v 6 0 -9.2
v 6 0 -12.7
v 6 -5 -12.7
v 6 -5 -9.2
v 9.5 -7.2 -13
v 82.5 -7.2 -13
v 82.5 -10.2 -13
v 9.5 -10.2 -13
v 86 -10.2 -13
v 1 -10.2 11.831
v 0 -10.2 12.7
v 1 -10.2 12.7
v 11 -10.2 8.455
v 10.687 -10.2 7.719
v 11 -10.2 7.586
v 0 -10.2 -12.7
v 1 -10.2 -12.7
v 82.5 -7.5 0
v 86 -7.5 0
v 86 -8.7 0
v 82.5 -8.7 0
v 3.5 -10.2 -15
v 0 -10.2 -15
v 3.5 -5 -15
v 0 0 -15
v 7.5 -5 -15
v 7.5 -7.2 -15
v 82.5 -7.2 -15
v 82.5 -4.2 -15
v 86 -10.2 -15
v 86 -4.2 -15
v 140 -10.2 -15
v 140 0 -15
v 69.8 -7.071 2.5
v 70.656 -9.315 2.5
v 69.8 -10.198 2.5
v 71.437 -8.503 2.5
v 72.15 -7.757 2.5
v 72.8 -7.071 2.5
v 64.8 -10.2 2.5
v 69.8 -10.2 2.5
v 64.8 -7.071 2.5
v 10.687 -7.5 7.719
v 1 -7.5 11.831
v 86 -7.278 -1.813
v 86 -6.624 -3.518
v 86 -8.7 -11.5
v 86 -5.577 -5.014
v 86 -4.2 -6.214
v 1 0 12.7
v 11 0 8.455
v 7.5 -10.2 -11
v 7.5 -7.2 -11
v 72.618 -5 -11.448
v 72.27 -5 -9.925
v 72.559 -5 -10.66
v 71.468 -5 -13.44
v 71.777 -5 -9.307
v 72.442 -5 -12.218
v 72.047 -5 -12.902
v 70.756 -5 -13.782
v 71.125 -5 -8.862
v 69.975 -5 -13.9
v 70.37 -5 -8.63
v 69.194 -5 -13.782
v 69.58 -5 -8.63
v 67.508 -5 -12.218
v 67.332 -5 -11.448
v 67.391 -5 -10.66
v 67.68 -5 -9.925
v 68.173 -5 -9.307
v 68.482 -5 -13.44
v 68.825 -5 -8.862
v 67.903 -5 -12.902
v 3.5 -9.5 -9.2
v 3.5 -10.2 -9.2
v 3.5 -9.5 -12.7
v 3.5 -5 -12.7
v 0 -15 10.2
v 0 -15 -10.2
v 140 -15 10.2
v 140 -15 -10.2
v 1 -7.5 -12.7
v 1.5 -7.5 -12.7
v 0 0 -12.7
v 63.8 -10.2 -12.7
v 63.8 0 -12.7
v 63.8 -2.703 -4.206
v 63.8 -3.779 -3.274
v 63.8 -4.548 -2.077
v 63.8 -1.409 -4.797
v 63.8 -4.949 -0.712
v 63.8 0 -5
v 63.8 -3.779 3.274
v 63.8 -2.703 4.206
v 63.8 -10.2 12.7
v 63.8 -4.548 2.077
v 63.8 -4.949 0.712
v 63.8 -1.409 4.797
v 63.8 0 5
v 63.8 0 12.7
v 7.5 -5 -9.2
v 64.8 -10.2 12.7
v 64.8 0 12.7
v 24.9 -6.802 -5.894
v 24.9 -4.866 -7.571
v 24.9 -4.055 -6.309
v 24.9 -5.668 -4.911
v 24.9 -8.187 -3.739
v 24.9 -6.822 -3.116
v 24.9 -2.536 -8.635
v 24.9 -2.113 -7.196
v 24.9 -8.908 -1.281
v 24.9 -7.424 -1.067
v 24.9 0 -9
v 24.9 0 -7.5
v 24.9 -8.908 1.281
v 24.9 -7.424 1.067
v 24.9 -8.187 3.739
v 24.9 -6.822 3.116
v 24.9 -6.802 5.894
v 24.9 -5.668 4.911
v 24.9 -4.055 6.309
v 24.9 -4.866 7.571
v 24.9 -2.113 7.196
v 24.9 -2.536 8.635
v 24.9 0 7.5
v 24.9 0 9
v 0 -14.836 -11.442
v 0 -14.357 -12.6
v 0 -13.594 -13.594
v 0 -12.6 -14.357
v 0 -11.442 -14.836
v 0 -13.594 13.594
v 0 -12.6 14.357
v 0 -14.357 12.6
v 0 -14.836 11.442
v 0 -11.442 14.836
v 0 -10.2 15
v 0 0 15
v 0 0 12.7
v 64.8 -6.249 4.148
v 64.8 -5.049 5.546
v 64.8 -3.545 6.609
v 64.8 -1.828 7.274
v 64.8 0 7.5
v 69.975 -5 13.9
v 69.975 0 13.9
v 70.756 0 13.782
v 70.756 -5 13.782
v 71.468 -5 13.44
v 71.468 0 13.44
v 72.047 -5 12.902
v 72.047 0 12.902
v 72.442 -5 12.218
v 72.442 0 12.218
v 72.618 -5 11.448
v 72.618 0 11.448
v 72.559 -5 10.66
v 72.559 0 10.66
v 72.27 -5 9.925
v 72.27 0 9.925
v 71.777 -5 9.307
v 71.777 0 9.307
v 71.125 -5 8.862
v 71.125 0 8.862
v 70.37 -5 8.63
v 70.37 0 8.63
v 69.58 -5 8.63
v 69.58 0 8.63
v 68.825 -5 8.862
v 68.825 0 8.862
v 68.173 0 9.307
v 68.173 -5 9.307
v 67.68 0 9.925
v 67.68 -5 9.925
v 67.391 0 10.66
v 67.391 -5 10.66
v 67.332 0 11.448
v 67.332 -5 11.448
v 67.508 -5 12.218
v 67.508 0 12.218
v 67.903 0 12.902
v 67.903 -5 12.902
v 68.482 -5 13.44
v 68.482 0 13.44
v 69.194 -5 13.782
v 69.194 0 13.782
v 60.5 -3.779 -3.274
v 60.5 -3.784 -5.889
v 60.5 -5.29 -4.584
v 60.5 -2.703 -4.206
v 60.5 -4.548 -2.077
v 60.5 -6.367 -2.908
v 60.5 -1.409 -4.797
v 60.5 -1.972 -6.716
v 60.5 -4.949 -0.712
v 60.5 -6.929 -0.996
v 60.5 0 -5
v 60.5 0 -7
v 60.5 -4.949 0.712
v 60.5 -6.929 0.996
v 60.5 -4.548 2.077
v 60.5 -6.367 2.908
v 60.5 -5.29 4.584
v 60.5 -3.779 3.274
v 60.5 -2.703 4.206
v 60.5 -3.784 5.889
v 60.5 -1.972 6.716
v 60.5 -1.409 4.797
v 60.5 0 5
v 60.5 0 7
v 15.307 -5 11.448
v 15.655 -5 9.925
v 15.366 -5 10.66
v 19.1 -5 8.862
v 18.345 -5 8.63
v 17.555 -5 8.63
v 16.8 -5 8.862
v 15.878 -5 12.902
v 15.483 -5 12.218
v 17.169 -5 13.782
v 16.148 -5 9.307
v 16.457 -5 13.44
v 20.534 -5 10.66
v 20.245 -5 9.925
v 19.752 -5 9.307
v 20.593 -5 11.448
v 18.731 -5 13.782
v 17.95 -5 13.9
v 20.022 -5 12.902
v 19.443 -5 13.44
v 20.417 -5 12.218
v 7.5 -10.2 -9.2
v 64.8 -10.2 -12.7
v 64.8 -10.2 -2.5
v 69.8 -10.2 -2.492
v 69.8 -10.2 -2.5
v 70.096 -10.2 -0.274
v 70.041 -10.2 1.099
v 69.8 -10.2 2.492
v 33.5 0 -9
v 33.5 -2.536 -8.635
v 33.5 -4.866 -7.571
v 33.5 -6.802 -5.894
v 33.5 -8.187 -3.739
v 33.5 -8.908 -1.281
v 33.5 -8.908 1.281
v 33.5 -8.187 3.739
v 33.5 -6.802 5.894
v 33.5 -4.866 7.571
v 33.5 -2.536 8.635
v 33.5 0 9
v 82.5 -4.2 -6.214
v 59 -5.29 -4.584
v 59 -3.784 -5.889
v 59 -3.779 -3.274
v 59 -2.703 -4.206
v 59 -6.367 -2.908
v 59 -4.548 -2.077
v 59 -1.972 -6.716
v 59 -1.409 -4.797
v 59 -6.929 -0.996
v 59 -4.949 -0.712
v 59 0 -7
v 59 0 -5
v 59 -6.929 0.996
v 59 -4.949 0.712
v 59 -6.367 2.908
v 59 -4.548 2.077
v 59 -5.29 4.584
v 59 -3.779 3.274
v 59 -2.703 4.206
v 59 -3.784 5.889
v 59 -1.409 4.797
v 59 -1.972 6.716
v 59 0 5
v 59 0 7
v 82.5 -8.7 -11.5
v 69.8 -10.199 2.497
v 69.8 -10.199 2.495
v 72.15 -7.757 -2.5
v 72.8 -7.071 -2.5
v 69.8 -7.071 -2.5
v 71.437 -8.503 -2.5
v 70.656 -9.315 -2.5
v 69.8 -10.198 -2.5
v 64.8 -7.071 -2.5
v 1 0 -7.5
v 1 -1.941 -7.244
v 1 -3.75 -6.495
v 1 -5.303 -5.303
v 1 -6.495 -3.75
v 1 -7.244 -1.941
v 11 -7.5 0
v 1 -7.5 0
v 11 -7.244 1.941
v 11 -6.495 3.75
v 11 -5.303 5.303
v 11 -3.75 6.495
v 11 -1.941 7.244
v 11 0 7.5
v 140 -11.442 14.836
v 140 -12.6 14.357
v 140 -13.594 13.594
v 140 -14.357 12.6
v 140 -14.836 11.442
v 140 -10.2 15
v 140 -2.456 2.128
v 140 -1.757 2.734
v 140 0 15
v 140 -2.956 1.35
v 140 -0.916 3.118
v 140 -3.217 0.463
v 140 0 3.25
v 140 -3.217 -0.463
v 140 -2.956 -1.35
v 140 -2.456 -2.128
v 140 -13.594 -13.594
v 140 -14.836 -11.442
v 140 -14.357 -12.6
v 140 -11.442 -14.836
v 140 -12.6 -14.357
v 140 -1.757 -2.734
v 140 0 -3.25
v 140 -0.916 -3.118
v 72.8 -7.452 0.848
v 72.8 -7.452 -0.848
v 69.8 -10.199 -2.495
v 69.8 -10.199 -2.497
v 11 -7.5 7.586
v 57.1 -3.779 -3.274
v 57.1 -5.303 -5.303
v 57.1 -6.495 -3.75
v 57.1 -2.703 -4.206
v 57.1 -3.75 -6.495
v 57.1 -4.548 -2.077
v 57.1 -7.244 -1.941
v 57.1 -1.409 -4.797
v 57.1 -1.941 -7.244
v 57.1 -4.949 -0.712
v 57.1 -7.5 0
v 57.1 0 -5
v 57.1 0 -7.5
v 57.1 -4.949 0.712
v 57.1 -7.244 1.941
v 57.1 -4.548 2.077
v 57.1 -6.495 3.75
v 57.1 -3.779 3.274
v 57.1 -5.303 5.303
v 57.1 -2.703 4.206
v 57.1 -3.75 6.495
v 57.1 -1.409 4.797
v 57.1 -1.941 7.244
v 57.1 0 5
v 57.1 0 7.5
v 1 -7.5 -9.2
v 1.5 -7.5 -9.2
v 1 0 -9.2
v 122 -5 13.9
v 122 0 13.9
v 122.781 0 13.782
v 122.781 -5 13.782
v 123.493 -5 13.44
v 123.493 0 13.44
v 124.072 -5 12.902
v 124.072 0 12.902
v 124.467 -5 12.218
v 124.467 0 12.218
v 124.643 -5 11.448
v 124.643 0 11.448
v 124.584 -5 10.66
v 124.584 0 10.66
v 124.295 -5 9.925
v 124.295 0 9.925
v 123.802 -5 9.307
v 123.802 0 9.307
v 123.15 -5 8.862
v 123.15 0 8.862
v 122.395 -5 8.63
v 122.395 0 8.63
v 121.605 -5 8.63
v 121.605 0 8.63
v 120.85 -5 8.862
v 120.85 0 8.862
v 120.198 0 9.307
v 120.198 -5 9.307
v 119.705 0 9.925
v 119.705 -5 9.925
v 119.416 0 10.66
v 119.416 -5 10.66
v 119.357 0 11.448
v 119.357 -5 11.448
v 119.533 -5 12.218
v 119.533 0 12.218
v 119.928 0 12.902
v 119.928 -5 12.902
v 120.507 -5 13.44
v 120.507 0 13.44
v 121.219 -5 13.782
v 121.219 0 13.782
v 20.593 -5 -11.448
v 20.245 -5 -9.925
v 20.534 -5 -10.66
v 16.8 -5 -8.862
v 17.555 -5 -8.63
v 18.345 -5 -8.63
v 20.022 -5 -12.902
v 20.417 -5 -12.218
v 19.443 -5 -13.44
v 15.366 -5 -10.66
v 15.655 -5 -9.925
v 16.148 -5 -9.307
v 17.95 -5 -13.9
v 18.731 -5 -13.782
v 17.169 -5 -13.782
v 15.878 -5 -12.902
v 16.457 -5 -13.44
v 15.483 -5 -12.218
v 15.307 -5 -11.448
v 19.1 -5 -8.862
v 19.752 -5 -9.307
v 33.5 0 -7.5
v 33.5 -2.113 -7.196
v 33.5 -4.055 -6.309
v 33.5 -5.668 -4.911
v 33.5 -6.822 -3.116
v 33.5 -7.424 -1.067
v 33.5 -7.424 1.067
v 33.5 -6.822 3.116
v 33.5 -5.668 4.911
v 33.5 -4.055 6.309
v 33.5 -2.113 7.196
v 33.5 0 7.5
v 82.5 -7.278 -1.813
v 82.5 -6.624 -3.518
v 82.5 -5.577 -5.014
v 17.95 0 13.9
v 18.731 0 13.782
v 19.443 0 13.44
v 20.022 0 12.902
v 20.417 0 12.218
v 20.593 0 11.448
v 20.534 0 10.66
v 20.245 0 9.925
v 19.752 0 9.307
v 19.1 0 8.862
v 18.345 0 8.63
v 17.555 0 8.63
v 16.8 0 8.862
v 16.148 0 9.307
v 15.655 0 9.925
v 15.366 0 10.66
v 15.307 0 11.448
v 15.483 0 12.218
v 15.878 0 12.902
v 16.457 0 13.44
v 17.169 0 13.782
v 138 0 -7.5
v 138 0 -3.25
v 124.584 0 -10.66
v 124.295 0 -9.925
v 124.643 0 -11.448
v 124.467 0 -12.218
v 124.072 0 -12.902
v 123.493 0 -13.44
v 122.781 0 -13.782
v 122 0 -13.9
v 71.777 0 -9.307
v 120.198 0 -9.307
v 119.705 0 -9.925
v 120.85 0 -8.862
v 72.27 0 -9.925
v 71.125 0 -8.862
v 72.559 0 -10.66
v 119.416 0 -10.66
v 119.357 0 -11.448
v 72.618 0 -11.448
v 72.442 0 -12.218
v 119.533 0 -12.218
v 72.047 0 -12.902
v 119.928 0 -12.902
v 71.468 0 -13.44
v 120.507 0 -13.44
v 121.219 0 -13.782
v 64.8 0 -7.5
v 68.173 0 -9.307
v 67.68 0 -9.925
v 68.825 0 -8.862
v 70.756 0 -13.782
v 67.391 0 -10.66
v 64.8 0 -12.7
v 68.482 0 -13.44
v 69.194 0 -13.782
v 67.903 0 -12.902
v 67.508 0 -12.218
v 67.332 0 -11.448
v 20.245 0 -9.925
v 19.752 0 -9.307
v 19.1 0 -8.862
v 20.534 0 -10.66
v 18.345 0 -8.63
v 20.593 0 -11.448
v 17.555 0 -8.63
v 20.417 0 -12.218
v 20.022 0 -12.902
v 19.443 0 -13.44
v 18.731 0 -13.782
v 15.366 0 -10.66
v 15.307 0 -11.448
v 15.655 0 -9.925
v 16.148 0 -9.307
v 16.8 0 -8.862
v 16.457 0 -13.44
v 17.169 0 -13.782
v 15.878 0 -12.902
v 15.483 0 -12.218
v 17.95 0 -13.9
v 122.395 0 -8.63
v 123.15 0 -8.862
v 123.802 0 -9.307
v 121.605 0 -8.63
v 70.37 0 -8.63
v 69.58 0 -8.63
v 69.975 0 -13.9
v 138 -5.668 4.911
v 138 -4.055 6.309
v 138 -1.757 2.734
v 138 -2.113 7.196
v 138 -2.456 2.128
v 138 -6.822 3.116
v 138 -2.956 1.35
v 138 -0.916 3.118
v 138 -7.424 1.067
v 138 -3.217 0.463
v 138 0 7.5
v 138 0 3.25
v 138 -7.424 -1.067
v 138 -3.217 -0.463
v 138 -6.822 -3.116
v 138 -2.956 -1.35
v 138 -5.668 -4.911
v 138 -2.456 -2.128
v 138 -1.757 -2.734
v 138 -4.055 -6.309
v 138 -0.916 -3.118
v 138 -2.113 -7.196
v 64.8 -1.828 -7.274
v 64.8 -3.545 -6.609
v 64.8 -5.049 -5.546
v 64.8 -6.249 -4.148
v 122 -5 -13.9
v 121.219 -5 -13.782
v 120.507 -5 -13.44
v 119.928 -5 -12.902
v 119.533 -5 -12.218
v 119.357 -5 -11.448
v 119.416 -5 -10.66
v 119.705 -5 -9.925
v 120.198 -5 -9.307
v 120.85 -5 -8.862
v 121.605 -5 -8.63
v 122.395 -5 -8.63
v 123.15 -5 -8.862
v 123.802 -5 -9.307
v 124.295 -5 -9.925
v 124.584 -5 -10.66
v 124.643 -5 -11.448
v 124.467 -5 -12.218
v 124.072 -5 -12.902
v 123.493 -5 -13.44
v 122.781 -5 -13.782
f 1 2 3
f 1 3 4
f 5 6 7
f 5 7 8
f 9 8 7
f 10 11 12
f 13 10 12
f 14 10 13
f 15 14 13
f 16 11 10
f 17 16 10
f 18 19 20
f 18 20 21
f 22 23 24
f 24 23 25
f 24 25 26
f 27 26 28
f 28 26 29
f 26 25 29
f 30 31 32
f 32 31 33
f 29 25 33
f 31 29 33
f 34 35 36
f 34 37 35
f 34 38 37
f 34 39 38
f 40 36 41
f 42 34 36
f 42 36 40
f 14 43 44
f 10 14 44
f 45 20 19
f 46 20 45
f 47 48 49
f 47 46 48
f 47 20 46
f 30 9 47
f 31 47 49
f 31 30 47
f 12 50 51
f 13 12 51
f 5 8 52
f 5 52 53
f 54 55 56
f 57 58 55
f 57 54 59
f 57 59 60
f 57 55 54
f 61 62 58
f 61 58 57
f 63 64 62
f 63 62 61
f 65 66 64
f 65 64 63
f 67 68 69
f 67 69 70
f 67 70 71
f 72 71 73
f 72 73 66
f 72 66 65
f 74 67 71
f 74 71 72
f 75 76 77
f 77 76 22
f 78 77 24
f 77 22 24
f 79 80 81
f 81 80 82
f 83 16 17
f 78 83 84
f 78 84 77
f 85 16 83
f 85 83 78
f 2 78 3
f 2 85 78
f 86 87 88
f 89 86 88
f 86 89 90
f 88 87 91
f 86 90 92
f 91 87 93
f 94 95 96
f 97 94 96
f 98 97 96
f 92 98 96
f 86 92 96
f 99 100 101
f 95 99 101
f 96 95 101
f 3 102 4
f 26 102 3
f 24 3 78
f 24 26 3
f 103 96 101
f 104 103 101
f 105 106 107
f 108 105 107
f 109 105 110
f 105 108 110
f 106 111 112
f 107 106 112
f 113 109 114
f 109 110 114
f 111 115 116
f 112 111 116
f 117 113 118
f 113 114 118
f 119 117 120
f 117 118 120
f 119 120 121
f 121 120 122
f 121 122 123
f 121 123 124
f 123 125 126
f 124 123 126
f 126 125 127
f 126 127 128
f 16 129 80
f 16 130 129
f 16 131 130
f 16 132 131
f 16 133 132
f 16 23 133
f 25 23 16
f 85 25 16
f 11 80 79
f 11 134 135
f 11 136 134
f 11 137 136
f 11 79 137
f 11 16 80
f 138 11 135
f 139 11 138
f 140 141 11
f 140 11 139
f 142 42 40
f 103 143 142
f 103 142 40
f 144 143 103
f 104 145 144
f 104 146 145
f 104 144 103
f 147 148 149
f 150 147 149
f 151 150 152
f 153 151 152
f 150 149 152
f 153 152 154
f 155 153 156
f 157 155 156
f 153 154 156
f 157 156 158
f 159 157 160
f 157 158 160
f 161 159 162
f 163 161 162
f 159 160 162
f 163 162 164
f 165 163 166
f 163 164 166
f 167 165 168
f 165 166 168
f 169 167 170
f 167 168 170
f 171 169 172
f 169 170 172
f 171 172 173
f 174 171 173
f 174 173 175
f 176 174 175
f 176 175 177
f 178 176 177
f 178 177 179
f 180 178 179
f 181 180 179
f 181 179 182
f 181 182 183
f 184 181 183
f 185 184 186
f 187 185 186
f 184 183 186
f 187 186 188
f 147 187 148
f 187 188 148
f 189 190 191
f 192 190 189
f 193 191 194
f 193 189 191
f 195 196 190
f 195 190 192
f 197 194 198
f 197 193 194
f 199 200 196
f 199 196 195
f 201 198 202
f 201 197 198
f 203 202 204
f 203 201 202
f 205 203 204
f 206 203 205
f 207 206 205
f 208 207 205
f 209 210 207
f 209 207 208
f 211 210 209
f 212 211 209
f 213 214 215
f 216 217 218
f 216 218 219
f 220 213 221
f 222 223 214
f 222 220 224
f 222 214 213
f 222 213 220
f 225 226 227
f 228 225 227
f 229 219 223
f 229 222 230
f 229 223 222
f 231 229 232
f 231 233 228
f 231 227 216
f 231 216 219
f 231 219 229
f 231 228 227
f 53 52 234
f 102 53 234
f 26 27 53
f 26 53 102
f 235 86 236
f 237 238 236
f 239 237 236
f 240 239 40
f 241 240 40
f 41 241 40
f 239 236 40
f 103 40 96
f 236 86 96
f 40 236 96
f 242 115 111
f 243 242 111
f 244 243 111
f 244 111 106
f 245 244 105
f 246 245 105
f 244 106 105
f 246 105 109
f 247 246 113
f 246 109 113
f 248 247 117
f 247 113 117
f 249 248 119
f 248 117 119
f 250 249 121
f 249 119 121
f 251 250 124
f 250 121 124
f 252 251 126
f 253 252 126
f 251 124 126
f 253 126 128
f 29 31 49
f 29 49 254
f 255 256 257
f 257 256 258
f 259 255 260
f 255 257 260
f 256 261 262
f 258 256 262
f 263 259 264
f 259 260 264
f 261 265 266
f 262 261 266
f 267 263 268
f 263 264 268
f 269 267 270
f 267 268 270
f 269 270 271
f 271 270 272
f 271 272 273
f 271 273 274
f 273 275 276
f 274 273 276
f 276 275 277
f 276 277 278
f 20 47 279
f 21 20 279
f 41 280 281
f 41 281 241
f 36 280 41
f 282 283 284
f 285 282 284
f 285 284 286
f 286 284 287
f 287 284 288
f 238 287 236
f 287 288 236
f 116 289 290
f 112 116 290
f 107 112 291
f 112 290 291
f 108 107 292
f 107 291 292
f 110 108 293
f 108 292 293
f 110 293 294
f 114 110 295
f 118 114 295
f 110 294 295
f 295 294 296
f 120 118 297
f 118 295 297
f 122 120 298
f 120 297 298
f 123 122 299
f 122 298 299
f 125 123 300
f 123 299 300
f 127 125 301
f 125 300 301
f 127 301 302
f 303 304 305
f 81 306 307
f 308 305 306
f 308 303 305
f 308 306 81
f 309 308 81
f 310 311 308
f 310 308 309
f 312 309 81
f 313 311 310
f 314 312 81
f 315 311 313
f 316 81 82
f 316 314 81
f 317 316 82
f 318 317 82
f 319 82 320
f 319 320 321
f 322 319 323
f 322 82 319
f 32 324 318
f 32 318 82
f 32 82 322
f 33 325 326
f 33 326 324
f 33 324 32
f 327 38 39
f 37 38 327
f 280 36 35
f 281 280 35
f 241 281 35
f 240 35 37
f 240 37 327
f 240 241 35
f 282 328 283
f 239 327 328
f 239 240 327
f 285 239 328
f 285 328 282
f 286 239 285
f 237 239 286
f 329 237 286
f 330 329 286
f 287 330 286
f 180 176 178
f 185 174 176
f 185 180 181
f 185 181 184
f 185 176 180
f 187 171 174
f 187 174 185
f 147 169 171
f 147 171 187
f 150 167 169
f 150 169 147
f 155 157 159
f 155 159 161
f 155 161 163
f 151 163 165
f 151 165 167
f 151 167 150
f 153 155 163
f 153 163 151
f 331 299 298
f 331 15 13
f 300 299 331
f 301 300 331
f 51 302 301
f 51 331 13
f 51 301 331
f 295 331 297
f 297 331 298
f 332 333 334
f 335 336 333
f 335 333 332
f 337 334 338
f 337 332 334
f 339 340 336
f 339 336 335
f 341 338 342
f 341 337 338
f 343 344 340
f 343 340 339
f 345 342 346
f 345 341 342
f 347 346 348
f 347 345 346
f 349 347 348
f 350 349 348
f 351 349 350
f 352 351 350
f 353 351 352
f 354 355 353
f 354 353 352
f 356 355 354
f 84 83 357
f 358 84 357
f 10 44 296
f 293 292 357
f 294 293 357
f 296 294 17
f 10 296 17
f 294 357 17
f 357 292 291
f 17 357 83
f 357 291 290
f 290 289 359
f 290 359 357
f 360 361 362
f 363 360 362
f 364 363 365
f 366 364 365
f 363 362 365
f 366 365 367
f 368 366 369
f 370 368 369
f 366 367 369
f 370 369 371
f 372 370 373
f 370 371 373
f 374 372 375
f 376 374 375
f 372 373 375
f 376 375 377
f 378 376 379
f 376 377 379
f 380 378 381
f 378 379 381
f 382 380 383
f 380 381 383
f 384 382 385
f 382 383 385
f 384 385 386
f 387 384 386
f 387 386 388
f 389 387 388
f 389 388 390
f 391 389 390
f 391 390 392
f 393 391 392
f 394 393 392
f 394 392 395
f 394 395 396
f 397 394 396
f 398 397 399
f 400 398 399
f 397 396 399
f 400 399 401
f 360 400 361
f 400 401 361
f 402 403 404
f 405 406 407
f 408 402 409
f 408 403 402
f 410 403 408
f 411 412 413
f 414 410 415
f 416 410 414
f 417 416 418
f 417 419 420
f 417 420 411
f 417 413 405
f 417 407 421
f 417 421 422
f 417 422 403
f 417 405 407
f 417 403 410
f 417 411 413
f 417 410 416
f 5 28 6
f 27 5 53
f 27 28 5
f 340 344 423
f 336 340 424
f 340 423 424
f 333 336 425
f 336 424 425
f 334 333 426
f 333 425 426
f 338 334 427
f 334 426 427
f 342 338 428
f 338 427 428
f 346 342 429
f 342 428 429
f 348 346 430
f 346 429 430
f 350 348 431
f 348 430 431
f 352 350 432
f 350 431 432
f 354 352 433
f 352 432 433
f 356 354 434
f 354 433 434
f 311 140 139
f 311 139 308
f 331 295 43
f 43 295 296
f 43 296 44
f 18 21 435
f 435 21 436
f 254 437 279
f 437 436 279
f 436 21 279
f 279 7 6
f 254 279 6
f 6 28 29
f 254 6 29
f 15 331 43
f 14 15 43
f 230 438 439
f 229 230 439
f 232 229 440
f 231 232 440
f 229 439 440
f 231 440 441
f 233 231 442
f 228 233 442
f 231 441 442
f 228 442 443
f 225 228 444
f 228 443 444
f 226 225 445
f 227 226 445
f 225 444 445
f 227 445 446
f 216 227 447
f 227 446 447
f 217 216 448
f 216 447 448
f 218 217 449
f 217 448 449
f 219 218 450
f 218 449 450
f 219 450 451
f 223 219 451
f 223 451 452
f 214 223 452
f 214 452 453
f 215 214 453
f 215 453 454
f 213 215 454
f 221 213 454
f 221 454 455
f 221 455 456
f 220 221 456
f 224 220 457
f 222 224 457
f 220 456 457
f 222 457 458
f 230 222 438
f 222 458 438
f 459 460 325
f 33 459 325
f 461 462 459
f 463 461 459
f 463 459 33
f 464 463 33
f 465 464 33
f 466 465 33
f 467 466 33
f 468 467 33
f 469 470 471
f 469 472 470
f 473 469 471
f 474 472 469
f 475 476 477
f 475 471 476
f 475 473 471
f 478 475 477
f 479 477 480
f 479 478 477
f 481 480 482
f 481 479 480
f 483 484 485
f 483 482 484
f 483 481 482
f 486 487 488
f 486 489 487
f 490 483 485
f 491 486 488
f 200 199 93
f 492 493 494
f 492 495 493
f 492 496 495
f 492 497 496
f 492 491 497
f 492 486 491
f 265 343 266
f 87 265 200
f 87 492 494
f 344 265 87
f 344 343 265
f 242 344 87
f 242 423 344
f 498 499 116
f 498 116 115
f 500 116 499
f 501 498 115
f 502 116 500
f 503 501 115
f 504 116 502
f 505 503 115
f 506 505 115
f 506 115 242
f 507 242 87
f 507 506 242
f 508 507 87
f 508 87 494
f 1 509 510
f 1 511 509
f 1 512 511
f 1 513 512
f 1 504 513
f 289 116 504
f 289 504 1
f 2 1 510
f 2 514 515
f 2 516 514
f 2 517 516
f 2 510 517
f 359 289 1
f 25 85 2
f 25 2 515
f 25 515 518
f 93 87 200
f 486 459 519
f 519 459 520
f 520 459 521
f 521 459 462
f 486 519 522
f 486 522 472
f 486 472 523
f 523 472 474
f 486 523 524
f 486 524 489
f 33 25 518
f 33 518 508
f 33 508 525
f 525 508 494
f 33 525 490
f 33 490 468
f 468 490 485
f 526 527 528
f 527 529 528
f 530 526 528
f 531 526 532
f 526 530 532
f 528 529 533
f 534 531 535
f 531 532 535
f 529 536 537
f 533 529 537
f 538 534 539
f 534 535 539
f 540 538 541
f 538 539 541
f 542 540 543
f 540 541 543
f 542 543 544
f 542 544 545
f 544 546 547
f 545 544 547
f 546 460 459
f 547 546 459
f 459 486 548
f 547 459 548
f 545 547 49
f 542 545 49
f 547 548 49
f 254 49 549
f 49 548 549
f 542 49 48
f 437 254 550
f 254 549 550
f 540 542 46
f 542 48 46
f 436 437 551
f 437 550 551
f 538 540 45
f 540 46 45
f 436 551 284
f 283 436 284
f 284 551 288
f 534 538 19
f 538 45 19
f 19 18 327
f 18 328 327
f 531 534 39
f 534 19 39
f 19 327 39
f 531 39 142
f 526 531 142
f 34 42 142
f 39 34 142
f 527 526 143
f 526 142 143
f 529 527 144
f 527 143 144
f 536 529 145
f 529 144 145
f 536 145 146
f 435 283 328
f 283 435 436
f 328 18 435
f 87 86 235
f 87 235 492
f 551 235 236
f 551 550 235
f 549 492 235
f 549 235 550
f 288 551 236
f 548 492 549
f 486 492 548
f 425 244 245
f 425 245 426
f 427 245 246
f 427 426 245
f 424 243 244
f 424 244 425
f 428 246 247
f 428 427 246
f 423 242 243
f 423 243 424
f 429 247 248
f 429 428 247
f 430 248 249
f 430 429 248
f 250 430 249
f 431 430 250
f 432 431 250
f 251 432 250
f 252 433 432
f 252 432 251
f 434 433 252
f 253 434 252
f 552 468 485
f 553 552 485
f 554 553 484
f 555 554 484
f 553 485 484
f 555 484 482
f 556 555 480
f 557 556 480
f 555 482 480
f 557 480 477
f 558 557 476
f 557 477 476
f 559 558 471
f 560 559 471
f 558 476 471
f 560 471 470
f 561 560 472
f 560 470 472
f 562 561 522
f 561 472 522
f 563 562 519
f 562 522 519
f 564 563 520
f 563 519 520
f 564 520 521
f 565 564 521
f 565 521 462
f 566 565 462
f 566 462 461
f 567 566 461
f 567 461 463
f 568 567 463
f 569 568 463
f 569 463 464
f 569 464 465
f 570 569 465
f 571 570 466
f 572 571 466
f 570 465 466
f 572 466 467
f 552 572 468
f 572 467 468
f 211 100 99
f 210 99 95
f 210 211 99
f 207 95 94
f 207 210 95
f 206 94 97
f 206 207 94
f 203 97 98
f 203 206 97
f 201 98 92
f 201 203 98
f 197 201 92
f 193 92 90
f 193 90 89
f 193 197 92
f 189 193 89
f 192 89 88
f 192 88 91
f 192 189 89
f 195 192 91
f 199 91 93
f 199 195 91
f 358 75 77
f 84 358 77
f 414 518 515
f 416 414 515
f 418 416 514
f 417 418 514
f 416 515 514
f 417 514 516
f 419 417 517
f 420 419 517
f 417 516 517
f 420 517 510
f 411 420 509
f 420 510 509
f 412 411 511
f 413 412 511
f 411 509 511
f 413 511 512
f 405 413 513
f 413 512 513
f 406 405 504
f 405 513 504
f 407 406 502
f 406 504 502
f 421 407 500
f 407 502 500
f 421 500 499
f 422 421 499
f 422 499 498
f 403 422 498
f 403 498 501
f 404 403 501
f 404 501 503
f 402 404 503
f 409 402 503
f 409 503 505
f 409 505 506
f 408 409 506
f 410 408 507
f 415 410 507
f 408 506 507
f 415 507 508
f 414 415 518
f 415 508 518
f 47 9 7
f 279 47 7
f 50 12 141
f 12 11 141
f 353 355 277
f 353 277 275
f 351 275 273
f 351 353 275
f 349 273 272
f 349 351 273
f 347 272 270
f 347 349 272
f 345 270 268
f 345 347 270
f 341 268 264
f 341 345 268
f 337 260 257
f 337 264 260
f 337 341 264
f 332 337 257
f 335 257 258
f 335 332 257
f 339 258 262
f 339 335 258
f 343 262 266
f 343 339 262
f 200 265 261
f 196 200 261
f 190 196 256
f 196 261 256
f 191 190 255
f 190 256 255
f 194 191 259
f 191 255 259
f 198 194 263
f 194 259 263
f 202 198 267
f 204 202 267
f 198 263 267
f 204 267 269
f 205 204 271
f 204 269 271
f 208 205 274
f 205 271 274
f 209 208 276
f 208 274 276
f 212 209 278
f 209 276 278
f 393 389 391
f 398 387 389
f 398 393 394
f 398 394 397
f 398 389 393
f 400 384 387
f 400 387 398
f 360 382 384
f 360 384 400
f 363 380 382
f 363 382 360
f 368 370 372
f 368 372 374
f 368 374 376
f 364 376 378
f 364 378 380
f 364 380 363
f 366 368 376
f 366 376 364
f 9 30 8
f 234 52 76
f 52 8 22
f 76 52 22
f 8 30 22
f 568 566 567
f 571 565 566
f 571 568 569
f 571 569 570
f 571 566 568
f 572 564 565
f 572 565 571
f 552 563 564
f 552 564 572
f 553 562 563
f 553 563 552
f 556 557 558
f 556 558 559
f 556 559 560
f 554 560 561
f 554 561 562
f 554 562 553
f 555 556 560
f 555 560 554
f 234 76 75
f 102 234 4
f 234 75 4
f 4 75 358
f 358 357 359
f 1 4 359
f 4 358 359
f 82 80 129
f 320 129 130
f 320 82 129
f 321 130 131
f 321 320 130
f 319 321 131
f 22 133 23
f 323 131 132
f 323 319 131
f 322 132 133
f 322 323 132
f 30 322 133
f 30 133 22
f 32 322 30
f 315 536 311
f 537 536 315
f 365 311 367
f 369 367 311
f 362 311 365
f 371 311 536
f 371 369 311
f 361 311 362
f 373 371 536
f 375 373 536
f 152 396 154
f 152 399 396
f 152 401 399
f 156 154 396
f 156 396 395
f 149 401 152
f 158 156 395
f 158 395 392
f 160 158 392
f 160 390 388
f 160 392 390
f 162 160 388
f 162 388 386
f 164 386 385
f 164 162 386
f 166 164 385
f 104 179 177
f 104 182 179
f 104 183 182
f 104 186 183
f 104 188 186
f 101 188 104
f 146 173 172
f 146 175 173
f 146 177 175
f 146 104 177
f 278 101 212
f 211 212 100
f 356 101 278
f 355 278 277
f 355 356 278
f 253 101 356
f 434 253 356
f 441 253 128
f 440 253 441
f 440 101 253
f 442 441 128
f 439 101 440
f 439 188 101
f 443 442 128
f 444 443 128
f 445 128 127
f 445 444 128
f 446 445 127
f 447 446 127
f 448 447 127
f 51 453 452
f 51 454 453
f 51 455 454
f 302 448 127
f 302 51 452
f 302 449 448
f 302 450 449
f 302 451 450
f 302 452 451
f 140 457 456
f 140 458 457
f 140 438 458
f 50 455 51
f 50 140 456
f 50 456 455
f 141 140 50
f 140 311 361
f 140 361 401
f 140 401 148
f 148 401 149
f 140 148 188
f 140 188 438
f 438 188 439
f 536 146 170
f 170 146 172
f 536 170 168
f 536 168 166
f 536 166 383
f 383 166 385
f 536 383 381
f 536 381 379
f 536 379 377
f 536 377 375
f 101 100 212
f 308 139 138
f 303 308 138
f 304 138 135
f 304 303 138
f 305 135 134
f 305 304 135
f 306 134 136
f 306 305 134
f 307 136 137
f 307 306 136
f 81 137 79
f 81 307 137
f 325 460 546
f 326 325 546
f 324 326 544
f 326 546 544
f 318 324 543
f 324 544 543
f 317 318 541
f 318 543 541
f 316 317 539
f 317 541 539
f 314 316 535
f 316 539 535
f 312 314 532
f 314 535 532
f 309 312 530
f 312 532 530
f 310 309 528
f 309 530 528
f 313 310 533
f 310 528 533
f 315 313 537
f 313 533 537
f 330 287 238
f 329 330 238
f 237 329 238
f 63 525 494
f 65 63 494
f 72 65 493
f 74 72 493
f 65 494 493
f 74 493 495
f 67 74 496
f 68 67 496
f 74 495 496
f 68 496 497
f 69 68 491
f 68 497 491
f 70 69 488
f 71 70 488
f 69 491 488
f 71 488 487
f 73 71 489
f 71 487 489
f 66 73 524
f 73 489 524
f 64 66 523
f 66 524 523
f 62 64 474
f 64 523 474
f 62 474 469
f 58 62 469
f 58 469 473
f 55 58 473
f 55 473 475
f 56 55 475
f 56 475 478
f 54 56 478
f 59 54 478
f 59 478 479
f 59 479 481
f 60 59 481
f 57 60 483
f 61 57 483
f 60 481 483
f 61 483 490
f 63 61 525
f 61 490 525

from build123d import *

# Parameters (mm, degrees)
SKETCH2_W             = 140
SKETCH2_H             = 15
BASE_DEPTH            = 15
SKETCH3_R             = 7.5
CENTER_CUT_DEPTH      = 142.598022585
SKETCH4_W             = 1
SKETCH4_H             = 25.4
ANTENNA_PCB_DEPTH     = 10.2
SKETCH11_W            = 3.5
SKETCH11_H            = 15
COAX_CONNECTOR_DEPTH  = 5
LENS_START            = -23.9
SKETCH8_R             = 9
LENS_DEPTH            = 8.6
FILLET1_R             = 4.8
SKETCH17_W            = 82.5
SKETCH17_H            = 3
CUT_EXTRUDE4_DEPTH    = 2
SKETCH19_W            = 4
SKETCH19_H            = 5.2
CUT_EXTRUDE5_DEPTH    = 5.8
SKETCH21_W            = 3.5
SKETCH21_H            = 4.5
CUT_EXTRUDE6_DEPTH    = 15
FILLET7_SIZE          = 1.5
COAX_CABLE_HOLE_START = -2
COAX_CABLE_HOLE_DEPTH = 2
SKETCH23_W            = 12.7
SKETCH23_H            = 7.5
CUT_EXTRUDE7_DEPTH    = 10
BOSS_EXTRUDE1_REACH   = 143.598
CUT_EXTRUDE10_DEPTH   = 2.7
SKETCH31_R            = 2.65
MOUNTING_HOLES_DEPTH  = 5
FILLET11_SIZE         = 2
PHOTODIODE_PCB_START  = -62.8
SKETCH10_W            = 25.4
SKETCH10_H            = 20.4
PHOTODIODE_PCB_DEPTH  = 1
CUT_EXTRUDE13_DEPTH   = 5
CHAMFER2_SIZE         = 3
FILTER_MOUNT_START    = -56.1
FILTER_MOUNT_DEPTH    = 6.7
FILTER_SPACE_START    = -58
SKETCH36_R            = 7
FILTER_SPACE_DEPTH    = 1.5


# Some blends are built 0.0001 mm under size
with BuildPart() as part:
    # Sketch2 → Base (new body)
    with BuildSketch(Plane(origin=(0, 0, 0), x_dir=(1, 0, 0), z_dir=(0, 1, 0))):
        with Locations((70, -7.5)):
            Rectangle(SKETCH2_W, SKETCH2_H)
        with Locations((70, 7.5)):
            Rectangle(SKETCH2_W, SKETCH2_H)
    extrude(amount=-BASE_DEPTH)

    # Sketch3 → Center_cut (cut, through all)
    with BuildSketch(Plane.ZY):
        Circle(SKETCH3_R)
    extrude(amount=-CENTER_CUT_DEPTH, mode=Mode.SUBTRACT)

    # Sketch4 → Antenna_PCB (cut)
    with BuildSketch(Plane(origin=(0, 0, 0), x_dir=(1, 0, 0), z_dir=(0, 1, 0))):
        with Locations((0.5, 0)):
            Rectangle(SKETCH4_W, SKETCH4_H)
    extrude(amount=-ANTENNA_PCB_DEPTH, mode=Mode.SUBTRACT)

    # Sketch11 → Coax_connector (cut)
    with BuildSketch(Plane.ZY.offset(-1)):
        with Locations((-10.95, 0)):
            Rectangle(SKETCH11_W, SKETCH11_H)
    extrude(amount=-COAX_CONNECTOR_DEPTH, mode=Mode.SUBTRACT)

    # Sketch8 → Lens (cut)
    with BuildSketch(Plane.ZY.offset(-1).offset(LENS_START)):
        Circle(SKETCH8_R)
    extrude(amount=-LENS_DEPTH, mode=Mode.SUBTRACT)

    # Fillet1
    fillet1_edges = [part.edges().sort_by_distance(p)[0] for p in [
        (70, -15, -15),
        (70, -15, 15),
    ]]
    fillet(fillet1_edges, radius=FILLET1_R)

    # Sketch17 → Cut-Extrude4 (cut)
    with BuildSketch(Plane(origin=(0, 0, -15), x_dir=(-1, 0, 0), z_dir=(0, 0, -1))):
        with Locations((-44.75, -8.7)):
            Rectangle(SKETCH17_W, SKETCH17_H)
    extrude(amount=-CUT_EXTRUDE4_DEPTH, mode=Mode.SUBTRACT)

    # Sketch19 → Cut-Extrude5 (cut)
    with BuildSketch(Plane(origin=(0, 0, -15), x_dir=(-1, 0, 0), z_dir=(0, 0, -1))):
        with Locations((-5.5, -7.6)):
            Rectangle(SKETCH19_W, SKETCH19_H)
    extrude(amount=-CUT_EXTRUDE5_DEPTH, mode=Mode.SUBTRACT)

    # Sketch21 → Cut-Extrude6 (cut)
    with BuildSketch(Plane(origin=(0, 0, -15), x_dir=(-1, 0, 0), z_dir=(0, 0, -1))):
        with Locations((-84.25, -6.45)):
            Rectangle(SKETCH21_W, SKETCH21_H)
    extrude(amount=-CUT_EXTRUDE6_DEPTH, mode=Mode.SUBTRACT)

    # Fillet7
    fillet7_edges = [part.edges().sort_by_distance(p)[0] for p in [
        (84.25, -8.7, -13),
    ]]
    chamfer(fillet7_edges, length=FILLET7_SIZE - 0.0001)  # a hair under: the kernel refuses the full size

    # Sketch22 → Coax_cable_hole (add)
    with BuildSketch(Plane(origin=(140, 0, 0), x_dir=(0, 0, -1), z_dir=(1, 0, 0)).offset(COAX_CABLE_HOLE_START)):
        with BuildLine():
            ThreePointArc((-7.5, 0), (0, -7.5), (7.5, 0))
            Line((7.5, 0), (3.25, 0))
            ThreePointArc((3.25, 0), (0, -3.25), (-3.25, 0))
            Line((-3.25, 0), (-7.5, 0))
        make_face()
        with BuildLine():
            Line((11.25, -8), (11.25, 0))
            Line((11.25, 0), (7.5, 0))
            ThreePointArc((7.5, 0), (0, -7.5), (-7.5, 0))
            Line((-7.5, 0), (-11.25, 0))
            Line((-11.25, 0), (-11.25, -8))
            Line((-11.25, -8), (11.25, -8))
        make_face()
    extrude(amount=COAX_CABLE_HOLE_DEPTH)

    # Sketch23 → Cut-Extrude7 (cut)
    with BuildSketch(Plane.ZY.offset(-1)):
        with Locations((6.35, -3.75)):
            Rectangle(SKETCH23_W, SKETCH23_H)
    extrude(amount=-CUT_EXTRUDE7_DEPTH, mode=Mode.SUBTRACT)

    # Sketch24 → Boss-Extrude1 (add, up to next)
    with BuildSketch(Plane(origin=(0, 0, 0), x_dir=(1, 0, 0), z_dir=(0, 1, 0)), mode=Mode.PRIVATE) as boss_extrude1_sk1:
        Polygon((1, -12.7), (11, -8.455251838), (11, -12.7), align=None)
    boss_extrude1_tool1 = extrude(boss_extrude1_sk1.sketch, amount=-BOSS_EXTRUDE1_REACH, mode=Mode.PRIVATE) - part.part
    add(boss_extrude1_tool1.solids().sort_by_distance((7.666667, 0, 11.285084))[0])

    # Sketch27 → Cut-Extrude10 (cut)
    with BuildSketch(Plane(origin=(0, -7.5, 0), x_dir=(1, 0, 0), z_dir=(0, 1, 0))):
        Polygon((10.687415097, -7.718847955), (11, -8.455251838), (11, -7.586163536), align=None)
        Polygon((1, -12.7), (11, -8.455251838), (10.687415097, -7.718847955), (1, -11.830911698), align=None)
    extrude(amount=-CUT_EXTRUDE10_DEPTH, mode=Mode.SUBTRACT)

    # Sketch31 → Mounting_holes (cut)
    with BuildSketch(Plane(origin=(0, 0, 0), x_dir=(1, 0, 0), z_dir=(0, 1, 0))):
        with Locations(Location((17.95, -11.25, 0), (0, 0, 270))):
            Circle(SKETCH31_R)
        with Locations(Location((122, -11.25, 0), (0, 0, 270))):
            Circle(SKETCH31_R)
        with Locations(Location((122, 11.25, 0), (0, 0, 90))):
            Circle(SKETCH31_R)
        with Locations(Location((17.95, 11.25, 0), (0, 0, 90))):
            Circle(SKETCH31_R)
        with Locations(Location((69.975, -11.25, 0), (0, 0, 270))):
            Circle(SKETCH31_R)
        with Locations(Location((69.975, 11.25, 0), (0, 0, 90))):
            Circle(SKETCH31_R)
    extrude(amount=-MOUNTING_HOLES_DEPTH, mode=Mode.SUBTRACT)

    # Fillet11
    fillet11_edges = [part.edges().sort_by_distance(p)[0] for p in [
        (7.5, -8.7, -13),
        (3.5, -7.5, -10.95),
    ]]
    chamfer(fillet11_edges, length=FILLET11_SIZE)

    # Sketch10 → Photodiode_PCB (cut)
    with BuildSketch(Plane.ZY.offset(-1).offset(PHOTODIODE_PCB_START)):
        Rectangle(SKETCH10_W, SKETCH10_H)
    extrude(amount=-PHOTODIODE_PCB_DEPTH, mode=Mode.SUBTRACT)

    # Sketch33 → Cut-Extrude13 (cut)
    with BuildSketch(Plane.ZY.offset(-64.8)):
        with BuildLine():
            Line((-2.5, -10.2), (0, -10.2))
            Line((0, -10.2), (0, -7.5))
            ThreePointArc((0, -7.5), (-1.26826484, -7.391989197), (-2.5, -7.071067812))
            Line((-2.5, -7.071067812), (-2.5, -10.2))
        make_face()
        with BuildLine():
            Line((0, -10.2), (2.5, -10.2))
            Line((2.5, -10.2), (2.5, -7.071067812))
            ThreePointArc((2.5, -7.071067812), (1.26826484, -7.391989197), (0, -7.5))
            Line((0, -7.5), (0, -10.2))
        make_face()
    extrude(amount=-CUT_EXTRUDE13_DEPTH, mode=Mode.SUBTRACT)

    # Chamfer2
    # the kernel refuses this chamfer: 3 mm, written as the material it takes off along each edge
    with BuildSketch(Plane(origin=(69.8, 0, 0), x_dir=(0, -0.2008336879156208, 0.9796253517535216), z_dir=(0, 0.9796253517535216, 0.2008336879156208))) as chamfer2_piece_1_section:
        Polygon((7.5, CHAMFER2_SIZE), (7.5 + CHAMFER2_SIZE, 0), (7.5, 0), align=None)
    chamfer2_piece_1 = revolve(axis=Axis((69.8, 0, 0), (1, 0, 0)), revolution_arc=156.828569884, mode=Mode.PRIVATE)
    chamfer2_piece_1 = split(chamfer2_piece_1, bisect_by=Plane(origin=(70.802116042, -8.337432159, -2.5), z_dir=(0, 0, 1)), keep=Keep.TOP, mode=Mode.PRIVATE)
    chamfer2_piece_1 = split(chamfer2_piece_1, bisect_by=Plane(origin=(70.802116042, -10.2, 0), z_dir=(0, 1, 0)), keep=Keep.TOP, mode=Mode.PRIVATE)
    chamfer2_piece_1 = split(chamfer2_piece_1, bisect_by=Plane(origin=(70.802116042, -8.337432159, 2.5), z_dir=(0, 0, -1)), keep=Keep.TOP, mode=Mode.PRIVATE)
    add(chamfer2_piece_1, mode=Mode.SUBTRACT)

    # Sketch35 → Filter_mount (add)
    with BuildSketch(Plane.ZY.offset(-1).offset(FILTER_MOUNT_START)):
        with BuildLine():
            Line((-5, 0), (-7.5, 0))
            ThreePointArc((-7.5, 0), (-5.303300859, -5.303300859), (0, -7.5))
            ThreePointArc((0, -7.5), (5.303300859, -5.303300859), (7.5, 0))
            Line((7.5, 0), (5, 0))
            ThreePointArc((5, 0), (0, -5), (-5, 0))
        make_face()
    extrude(amount=-FILTER_MOUNT_DEPTH)

    # Sketch36 → Filter_space (cut)
    with BuildSketch(Plane.ZY.offset(-1).offset(FILTER_SPACE_START)):
        Circle(SKETCH36_R)
    extrude(amount=-FILTER_SPACE_DEPTH, mode=Mode.SUBTRACT)


solid = part.part
